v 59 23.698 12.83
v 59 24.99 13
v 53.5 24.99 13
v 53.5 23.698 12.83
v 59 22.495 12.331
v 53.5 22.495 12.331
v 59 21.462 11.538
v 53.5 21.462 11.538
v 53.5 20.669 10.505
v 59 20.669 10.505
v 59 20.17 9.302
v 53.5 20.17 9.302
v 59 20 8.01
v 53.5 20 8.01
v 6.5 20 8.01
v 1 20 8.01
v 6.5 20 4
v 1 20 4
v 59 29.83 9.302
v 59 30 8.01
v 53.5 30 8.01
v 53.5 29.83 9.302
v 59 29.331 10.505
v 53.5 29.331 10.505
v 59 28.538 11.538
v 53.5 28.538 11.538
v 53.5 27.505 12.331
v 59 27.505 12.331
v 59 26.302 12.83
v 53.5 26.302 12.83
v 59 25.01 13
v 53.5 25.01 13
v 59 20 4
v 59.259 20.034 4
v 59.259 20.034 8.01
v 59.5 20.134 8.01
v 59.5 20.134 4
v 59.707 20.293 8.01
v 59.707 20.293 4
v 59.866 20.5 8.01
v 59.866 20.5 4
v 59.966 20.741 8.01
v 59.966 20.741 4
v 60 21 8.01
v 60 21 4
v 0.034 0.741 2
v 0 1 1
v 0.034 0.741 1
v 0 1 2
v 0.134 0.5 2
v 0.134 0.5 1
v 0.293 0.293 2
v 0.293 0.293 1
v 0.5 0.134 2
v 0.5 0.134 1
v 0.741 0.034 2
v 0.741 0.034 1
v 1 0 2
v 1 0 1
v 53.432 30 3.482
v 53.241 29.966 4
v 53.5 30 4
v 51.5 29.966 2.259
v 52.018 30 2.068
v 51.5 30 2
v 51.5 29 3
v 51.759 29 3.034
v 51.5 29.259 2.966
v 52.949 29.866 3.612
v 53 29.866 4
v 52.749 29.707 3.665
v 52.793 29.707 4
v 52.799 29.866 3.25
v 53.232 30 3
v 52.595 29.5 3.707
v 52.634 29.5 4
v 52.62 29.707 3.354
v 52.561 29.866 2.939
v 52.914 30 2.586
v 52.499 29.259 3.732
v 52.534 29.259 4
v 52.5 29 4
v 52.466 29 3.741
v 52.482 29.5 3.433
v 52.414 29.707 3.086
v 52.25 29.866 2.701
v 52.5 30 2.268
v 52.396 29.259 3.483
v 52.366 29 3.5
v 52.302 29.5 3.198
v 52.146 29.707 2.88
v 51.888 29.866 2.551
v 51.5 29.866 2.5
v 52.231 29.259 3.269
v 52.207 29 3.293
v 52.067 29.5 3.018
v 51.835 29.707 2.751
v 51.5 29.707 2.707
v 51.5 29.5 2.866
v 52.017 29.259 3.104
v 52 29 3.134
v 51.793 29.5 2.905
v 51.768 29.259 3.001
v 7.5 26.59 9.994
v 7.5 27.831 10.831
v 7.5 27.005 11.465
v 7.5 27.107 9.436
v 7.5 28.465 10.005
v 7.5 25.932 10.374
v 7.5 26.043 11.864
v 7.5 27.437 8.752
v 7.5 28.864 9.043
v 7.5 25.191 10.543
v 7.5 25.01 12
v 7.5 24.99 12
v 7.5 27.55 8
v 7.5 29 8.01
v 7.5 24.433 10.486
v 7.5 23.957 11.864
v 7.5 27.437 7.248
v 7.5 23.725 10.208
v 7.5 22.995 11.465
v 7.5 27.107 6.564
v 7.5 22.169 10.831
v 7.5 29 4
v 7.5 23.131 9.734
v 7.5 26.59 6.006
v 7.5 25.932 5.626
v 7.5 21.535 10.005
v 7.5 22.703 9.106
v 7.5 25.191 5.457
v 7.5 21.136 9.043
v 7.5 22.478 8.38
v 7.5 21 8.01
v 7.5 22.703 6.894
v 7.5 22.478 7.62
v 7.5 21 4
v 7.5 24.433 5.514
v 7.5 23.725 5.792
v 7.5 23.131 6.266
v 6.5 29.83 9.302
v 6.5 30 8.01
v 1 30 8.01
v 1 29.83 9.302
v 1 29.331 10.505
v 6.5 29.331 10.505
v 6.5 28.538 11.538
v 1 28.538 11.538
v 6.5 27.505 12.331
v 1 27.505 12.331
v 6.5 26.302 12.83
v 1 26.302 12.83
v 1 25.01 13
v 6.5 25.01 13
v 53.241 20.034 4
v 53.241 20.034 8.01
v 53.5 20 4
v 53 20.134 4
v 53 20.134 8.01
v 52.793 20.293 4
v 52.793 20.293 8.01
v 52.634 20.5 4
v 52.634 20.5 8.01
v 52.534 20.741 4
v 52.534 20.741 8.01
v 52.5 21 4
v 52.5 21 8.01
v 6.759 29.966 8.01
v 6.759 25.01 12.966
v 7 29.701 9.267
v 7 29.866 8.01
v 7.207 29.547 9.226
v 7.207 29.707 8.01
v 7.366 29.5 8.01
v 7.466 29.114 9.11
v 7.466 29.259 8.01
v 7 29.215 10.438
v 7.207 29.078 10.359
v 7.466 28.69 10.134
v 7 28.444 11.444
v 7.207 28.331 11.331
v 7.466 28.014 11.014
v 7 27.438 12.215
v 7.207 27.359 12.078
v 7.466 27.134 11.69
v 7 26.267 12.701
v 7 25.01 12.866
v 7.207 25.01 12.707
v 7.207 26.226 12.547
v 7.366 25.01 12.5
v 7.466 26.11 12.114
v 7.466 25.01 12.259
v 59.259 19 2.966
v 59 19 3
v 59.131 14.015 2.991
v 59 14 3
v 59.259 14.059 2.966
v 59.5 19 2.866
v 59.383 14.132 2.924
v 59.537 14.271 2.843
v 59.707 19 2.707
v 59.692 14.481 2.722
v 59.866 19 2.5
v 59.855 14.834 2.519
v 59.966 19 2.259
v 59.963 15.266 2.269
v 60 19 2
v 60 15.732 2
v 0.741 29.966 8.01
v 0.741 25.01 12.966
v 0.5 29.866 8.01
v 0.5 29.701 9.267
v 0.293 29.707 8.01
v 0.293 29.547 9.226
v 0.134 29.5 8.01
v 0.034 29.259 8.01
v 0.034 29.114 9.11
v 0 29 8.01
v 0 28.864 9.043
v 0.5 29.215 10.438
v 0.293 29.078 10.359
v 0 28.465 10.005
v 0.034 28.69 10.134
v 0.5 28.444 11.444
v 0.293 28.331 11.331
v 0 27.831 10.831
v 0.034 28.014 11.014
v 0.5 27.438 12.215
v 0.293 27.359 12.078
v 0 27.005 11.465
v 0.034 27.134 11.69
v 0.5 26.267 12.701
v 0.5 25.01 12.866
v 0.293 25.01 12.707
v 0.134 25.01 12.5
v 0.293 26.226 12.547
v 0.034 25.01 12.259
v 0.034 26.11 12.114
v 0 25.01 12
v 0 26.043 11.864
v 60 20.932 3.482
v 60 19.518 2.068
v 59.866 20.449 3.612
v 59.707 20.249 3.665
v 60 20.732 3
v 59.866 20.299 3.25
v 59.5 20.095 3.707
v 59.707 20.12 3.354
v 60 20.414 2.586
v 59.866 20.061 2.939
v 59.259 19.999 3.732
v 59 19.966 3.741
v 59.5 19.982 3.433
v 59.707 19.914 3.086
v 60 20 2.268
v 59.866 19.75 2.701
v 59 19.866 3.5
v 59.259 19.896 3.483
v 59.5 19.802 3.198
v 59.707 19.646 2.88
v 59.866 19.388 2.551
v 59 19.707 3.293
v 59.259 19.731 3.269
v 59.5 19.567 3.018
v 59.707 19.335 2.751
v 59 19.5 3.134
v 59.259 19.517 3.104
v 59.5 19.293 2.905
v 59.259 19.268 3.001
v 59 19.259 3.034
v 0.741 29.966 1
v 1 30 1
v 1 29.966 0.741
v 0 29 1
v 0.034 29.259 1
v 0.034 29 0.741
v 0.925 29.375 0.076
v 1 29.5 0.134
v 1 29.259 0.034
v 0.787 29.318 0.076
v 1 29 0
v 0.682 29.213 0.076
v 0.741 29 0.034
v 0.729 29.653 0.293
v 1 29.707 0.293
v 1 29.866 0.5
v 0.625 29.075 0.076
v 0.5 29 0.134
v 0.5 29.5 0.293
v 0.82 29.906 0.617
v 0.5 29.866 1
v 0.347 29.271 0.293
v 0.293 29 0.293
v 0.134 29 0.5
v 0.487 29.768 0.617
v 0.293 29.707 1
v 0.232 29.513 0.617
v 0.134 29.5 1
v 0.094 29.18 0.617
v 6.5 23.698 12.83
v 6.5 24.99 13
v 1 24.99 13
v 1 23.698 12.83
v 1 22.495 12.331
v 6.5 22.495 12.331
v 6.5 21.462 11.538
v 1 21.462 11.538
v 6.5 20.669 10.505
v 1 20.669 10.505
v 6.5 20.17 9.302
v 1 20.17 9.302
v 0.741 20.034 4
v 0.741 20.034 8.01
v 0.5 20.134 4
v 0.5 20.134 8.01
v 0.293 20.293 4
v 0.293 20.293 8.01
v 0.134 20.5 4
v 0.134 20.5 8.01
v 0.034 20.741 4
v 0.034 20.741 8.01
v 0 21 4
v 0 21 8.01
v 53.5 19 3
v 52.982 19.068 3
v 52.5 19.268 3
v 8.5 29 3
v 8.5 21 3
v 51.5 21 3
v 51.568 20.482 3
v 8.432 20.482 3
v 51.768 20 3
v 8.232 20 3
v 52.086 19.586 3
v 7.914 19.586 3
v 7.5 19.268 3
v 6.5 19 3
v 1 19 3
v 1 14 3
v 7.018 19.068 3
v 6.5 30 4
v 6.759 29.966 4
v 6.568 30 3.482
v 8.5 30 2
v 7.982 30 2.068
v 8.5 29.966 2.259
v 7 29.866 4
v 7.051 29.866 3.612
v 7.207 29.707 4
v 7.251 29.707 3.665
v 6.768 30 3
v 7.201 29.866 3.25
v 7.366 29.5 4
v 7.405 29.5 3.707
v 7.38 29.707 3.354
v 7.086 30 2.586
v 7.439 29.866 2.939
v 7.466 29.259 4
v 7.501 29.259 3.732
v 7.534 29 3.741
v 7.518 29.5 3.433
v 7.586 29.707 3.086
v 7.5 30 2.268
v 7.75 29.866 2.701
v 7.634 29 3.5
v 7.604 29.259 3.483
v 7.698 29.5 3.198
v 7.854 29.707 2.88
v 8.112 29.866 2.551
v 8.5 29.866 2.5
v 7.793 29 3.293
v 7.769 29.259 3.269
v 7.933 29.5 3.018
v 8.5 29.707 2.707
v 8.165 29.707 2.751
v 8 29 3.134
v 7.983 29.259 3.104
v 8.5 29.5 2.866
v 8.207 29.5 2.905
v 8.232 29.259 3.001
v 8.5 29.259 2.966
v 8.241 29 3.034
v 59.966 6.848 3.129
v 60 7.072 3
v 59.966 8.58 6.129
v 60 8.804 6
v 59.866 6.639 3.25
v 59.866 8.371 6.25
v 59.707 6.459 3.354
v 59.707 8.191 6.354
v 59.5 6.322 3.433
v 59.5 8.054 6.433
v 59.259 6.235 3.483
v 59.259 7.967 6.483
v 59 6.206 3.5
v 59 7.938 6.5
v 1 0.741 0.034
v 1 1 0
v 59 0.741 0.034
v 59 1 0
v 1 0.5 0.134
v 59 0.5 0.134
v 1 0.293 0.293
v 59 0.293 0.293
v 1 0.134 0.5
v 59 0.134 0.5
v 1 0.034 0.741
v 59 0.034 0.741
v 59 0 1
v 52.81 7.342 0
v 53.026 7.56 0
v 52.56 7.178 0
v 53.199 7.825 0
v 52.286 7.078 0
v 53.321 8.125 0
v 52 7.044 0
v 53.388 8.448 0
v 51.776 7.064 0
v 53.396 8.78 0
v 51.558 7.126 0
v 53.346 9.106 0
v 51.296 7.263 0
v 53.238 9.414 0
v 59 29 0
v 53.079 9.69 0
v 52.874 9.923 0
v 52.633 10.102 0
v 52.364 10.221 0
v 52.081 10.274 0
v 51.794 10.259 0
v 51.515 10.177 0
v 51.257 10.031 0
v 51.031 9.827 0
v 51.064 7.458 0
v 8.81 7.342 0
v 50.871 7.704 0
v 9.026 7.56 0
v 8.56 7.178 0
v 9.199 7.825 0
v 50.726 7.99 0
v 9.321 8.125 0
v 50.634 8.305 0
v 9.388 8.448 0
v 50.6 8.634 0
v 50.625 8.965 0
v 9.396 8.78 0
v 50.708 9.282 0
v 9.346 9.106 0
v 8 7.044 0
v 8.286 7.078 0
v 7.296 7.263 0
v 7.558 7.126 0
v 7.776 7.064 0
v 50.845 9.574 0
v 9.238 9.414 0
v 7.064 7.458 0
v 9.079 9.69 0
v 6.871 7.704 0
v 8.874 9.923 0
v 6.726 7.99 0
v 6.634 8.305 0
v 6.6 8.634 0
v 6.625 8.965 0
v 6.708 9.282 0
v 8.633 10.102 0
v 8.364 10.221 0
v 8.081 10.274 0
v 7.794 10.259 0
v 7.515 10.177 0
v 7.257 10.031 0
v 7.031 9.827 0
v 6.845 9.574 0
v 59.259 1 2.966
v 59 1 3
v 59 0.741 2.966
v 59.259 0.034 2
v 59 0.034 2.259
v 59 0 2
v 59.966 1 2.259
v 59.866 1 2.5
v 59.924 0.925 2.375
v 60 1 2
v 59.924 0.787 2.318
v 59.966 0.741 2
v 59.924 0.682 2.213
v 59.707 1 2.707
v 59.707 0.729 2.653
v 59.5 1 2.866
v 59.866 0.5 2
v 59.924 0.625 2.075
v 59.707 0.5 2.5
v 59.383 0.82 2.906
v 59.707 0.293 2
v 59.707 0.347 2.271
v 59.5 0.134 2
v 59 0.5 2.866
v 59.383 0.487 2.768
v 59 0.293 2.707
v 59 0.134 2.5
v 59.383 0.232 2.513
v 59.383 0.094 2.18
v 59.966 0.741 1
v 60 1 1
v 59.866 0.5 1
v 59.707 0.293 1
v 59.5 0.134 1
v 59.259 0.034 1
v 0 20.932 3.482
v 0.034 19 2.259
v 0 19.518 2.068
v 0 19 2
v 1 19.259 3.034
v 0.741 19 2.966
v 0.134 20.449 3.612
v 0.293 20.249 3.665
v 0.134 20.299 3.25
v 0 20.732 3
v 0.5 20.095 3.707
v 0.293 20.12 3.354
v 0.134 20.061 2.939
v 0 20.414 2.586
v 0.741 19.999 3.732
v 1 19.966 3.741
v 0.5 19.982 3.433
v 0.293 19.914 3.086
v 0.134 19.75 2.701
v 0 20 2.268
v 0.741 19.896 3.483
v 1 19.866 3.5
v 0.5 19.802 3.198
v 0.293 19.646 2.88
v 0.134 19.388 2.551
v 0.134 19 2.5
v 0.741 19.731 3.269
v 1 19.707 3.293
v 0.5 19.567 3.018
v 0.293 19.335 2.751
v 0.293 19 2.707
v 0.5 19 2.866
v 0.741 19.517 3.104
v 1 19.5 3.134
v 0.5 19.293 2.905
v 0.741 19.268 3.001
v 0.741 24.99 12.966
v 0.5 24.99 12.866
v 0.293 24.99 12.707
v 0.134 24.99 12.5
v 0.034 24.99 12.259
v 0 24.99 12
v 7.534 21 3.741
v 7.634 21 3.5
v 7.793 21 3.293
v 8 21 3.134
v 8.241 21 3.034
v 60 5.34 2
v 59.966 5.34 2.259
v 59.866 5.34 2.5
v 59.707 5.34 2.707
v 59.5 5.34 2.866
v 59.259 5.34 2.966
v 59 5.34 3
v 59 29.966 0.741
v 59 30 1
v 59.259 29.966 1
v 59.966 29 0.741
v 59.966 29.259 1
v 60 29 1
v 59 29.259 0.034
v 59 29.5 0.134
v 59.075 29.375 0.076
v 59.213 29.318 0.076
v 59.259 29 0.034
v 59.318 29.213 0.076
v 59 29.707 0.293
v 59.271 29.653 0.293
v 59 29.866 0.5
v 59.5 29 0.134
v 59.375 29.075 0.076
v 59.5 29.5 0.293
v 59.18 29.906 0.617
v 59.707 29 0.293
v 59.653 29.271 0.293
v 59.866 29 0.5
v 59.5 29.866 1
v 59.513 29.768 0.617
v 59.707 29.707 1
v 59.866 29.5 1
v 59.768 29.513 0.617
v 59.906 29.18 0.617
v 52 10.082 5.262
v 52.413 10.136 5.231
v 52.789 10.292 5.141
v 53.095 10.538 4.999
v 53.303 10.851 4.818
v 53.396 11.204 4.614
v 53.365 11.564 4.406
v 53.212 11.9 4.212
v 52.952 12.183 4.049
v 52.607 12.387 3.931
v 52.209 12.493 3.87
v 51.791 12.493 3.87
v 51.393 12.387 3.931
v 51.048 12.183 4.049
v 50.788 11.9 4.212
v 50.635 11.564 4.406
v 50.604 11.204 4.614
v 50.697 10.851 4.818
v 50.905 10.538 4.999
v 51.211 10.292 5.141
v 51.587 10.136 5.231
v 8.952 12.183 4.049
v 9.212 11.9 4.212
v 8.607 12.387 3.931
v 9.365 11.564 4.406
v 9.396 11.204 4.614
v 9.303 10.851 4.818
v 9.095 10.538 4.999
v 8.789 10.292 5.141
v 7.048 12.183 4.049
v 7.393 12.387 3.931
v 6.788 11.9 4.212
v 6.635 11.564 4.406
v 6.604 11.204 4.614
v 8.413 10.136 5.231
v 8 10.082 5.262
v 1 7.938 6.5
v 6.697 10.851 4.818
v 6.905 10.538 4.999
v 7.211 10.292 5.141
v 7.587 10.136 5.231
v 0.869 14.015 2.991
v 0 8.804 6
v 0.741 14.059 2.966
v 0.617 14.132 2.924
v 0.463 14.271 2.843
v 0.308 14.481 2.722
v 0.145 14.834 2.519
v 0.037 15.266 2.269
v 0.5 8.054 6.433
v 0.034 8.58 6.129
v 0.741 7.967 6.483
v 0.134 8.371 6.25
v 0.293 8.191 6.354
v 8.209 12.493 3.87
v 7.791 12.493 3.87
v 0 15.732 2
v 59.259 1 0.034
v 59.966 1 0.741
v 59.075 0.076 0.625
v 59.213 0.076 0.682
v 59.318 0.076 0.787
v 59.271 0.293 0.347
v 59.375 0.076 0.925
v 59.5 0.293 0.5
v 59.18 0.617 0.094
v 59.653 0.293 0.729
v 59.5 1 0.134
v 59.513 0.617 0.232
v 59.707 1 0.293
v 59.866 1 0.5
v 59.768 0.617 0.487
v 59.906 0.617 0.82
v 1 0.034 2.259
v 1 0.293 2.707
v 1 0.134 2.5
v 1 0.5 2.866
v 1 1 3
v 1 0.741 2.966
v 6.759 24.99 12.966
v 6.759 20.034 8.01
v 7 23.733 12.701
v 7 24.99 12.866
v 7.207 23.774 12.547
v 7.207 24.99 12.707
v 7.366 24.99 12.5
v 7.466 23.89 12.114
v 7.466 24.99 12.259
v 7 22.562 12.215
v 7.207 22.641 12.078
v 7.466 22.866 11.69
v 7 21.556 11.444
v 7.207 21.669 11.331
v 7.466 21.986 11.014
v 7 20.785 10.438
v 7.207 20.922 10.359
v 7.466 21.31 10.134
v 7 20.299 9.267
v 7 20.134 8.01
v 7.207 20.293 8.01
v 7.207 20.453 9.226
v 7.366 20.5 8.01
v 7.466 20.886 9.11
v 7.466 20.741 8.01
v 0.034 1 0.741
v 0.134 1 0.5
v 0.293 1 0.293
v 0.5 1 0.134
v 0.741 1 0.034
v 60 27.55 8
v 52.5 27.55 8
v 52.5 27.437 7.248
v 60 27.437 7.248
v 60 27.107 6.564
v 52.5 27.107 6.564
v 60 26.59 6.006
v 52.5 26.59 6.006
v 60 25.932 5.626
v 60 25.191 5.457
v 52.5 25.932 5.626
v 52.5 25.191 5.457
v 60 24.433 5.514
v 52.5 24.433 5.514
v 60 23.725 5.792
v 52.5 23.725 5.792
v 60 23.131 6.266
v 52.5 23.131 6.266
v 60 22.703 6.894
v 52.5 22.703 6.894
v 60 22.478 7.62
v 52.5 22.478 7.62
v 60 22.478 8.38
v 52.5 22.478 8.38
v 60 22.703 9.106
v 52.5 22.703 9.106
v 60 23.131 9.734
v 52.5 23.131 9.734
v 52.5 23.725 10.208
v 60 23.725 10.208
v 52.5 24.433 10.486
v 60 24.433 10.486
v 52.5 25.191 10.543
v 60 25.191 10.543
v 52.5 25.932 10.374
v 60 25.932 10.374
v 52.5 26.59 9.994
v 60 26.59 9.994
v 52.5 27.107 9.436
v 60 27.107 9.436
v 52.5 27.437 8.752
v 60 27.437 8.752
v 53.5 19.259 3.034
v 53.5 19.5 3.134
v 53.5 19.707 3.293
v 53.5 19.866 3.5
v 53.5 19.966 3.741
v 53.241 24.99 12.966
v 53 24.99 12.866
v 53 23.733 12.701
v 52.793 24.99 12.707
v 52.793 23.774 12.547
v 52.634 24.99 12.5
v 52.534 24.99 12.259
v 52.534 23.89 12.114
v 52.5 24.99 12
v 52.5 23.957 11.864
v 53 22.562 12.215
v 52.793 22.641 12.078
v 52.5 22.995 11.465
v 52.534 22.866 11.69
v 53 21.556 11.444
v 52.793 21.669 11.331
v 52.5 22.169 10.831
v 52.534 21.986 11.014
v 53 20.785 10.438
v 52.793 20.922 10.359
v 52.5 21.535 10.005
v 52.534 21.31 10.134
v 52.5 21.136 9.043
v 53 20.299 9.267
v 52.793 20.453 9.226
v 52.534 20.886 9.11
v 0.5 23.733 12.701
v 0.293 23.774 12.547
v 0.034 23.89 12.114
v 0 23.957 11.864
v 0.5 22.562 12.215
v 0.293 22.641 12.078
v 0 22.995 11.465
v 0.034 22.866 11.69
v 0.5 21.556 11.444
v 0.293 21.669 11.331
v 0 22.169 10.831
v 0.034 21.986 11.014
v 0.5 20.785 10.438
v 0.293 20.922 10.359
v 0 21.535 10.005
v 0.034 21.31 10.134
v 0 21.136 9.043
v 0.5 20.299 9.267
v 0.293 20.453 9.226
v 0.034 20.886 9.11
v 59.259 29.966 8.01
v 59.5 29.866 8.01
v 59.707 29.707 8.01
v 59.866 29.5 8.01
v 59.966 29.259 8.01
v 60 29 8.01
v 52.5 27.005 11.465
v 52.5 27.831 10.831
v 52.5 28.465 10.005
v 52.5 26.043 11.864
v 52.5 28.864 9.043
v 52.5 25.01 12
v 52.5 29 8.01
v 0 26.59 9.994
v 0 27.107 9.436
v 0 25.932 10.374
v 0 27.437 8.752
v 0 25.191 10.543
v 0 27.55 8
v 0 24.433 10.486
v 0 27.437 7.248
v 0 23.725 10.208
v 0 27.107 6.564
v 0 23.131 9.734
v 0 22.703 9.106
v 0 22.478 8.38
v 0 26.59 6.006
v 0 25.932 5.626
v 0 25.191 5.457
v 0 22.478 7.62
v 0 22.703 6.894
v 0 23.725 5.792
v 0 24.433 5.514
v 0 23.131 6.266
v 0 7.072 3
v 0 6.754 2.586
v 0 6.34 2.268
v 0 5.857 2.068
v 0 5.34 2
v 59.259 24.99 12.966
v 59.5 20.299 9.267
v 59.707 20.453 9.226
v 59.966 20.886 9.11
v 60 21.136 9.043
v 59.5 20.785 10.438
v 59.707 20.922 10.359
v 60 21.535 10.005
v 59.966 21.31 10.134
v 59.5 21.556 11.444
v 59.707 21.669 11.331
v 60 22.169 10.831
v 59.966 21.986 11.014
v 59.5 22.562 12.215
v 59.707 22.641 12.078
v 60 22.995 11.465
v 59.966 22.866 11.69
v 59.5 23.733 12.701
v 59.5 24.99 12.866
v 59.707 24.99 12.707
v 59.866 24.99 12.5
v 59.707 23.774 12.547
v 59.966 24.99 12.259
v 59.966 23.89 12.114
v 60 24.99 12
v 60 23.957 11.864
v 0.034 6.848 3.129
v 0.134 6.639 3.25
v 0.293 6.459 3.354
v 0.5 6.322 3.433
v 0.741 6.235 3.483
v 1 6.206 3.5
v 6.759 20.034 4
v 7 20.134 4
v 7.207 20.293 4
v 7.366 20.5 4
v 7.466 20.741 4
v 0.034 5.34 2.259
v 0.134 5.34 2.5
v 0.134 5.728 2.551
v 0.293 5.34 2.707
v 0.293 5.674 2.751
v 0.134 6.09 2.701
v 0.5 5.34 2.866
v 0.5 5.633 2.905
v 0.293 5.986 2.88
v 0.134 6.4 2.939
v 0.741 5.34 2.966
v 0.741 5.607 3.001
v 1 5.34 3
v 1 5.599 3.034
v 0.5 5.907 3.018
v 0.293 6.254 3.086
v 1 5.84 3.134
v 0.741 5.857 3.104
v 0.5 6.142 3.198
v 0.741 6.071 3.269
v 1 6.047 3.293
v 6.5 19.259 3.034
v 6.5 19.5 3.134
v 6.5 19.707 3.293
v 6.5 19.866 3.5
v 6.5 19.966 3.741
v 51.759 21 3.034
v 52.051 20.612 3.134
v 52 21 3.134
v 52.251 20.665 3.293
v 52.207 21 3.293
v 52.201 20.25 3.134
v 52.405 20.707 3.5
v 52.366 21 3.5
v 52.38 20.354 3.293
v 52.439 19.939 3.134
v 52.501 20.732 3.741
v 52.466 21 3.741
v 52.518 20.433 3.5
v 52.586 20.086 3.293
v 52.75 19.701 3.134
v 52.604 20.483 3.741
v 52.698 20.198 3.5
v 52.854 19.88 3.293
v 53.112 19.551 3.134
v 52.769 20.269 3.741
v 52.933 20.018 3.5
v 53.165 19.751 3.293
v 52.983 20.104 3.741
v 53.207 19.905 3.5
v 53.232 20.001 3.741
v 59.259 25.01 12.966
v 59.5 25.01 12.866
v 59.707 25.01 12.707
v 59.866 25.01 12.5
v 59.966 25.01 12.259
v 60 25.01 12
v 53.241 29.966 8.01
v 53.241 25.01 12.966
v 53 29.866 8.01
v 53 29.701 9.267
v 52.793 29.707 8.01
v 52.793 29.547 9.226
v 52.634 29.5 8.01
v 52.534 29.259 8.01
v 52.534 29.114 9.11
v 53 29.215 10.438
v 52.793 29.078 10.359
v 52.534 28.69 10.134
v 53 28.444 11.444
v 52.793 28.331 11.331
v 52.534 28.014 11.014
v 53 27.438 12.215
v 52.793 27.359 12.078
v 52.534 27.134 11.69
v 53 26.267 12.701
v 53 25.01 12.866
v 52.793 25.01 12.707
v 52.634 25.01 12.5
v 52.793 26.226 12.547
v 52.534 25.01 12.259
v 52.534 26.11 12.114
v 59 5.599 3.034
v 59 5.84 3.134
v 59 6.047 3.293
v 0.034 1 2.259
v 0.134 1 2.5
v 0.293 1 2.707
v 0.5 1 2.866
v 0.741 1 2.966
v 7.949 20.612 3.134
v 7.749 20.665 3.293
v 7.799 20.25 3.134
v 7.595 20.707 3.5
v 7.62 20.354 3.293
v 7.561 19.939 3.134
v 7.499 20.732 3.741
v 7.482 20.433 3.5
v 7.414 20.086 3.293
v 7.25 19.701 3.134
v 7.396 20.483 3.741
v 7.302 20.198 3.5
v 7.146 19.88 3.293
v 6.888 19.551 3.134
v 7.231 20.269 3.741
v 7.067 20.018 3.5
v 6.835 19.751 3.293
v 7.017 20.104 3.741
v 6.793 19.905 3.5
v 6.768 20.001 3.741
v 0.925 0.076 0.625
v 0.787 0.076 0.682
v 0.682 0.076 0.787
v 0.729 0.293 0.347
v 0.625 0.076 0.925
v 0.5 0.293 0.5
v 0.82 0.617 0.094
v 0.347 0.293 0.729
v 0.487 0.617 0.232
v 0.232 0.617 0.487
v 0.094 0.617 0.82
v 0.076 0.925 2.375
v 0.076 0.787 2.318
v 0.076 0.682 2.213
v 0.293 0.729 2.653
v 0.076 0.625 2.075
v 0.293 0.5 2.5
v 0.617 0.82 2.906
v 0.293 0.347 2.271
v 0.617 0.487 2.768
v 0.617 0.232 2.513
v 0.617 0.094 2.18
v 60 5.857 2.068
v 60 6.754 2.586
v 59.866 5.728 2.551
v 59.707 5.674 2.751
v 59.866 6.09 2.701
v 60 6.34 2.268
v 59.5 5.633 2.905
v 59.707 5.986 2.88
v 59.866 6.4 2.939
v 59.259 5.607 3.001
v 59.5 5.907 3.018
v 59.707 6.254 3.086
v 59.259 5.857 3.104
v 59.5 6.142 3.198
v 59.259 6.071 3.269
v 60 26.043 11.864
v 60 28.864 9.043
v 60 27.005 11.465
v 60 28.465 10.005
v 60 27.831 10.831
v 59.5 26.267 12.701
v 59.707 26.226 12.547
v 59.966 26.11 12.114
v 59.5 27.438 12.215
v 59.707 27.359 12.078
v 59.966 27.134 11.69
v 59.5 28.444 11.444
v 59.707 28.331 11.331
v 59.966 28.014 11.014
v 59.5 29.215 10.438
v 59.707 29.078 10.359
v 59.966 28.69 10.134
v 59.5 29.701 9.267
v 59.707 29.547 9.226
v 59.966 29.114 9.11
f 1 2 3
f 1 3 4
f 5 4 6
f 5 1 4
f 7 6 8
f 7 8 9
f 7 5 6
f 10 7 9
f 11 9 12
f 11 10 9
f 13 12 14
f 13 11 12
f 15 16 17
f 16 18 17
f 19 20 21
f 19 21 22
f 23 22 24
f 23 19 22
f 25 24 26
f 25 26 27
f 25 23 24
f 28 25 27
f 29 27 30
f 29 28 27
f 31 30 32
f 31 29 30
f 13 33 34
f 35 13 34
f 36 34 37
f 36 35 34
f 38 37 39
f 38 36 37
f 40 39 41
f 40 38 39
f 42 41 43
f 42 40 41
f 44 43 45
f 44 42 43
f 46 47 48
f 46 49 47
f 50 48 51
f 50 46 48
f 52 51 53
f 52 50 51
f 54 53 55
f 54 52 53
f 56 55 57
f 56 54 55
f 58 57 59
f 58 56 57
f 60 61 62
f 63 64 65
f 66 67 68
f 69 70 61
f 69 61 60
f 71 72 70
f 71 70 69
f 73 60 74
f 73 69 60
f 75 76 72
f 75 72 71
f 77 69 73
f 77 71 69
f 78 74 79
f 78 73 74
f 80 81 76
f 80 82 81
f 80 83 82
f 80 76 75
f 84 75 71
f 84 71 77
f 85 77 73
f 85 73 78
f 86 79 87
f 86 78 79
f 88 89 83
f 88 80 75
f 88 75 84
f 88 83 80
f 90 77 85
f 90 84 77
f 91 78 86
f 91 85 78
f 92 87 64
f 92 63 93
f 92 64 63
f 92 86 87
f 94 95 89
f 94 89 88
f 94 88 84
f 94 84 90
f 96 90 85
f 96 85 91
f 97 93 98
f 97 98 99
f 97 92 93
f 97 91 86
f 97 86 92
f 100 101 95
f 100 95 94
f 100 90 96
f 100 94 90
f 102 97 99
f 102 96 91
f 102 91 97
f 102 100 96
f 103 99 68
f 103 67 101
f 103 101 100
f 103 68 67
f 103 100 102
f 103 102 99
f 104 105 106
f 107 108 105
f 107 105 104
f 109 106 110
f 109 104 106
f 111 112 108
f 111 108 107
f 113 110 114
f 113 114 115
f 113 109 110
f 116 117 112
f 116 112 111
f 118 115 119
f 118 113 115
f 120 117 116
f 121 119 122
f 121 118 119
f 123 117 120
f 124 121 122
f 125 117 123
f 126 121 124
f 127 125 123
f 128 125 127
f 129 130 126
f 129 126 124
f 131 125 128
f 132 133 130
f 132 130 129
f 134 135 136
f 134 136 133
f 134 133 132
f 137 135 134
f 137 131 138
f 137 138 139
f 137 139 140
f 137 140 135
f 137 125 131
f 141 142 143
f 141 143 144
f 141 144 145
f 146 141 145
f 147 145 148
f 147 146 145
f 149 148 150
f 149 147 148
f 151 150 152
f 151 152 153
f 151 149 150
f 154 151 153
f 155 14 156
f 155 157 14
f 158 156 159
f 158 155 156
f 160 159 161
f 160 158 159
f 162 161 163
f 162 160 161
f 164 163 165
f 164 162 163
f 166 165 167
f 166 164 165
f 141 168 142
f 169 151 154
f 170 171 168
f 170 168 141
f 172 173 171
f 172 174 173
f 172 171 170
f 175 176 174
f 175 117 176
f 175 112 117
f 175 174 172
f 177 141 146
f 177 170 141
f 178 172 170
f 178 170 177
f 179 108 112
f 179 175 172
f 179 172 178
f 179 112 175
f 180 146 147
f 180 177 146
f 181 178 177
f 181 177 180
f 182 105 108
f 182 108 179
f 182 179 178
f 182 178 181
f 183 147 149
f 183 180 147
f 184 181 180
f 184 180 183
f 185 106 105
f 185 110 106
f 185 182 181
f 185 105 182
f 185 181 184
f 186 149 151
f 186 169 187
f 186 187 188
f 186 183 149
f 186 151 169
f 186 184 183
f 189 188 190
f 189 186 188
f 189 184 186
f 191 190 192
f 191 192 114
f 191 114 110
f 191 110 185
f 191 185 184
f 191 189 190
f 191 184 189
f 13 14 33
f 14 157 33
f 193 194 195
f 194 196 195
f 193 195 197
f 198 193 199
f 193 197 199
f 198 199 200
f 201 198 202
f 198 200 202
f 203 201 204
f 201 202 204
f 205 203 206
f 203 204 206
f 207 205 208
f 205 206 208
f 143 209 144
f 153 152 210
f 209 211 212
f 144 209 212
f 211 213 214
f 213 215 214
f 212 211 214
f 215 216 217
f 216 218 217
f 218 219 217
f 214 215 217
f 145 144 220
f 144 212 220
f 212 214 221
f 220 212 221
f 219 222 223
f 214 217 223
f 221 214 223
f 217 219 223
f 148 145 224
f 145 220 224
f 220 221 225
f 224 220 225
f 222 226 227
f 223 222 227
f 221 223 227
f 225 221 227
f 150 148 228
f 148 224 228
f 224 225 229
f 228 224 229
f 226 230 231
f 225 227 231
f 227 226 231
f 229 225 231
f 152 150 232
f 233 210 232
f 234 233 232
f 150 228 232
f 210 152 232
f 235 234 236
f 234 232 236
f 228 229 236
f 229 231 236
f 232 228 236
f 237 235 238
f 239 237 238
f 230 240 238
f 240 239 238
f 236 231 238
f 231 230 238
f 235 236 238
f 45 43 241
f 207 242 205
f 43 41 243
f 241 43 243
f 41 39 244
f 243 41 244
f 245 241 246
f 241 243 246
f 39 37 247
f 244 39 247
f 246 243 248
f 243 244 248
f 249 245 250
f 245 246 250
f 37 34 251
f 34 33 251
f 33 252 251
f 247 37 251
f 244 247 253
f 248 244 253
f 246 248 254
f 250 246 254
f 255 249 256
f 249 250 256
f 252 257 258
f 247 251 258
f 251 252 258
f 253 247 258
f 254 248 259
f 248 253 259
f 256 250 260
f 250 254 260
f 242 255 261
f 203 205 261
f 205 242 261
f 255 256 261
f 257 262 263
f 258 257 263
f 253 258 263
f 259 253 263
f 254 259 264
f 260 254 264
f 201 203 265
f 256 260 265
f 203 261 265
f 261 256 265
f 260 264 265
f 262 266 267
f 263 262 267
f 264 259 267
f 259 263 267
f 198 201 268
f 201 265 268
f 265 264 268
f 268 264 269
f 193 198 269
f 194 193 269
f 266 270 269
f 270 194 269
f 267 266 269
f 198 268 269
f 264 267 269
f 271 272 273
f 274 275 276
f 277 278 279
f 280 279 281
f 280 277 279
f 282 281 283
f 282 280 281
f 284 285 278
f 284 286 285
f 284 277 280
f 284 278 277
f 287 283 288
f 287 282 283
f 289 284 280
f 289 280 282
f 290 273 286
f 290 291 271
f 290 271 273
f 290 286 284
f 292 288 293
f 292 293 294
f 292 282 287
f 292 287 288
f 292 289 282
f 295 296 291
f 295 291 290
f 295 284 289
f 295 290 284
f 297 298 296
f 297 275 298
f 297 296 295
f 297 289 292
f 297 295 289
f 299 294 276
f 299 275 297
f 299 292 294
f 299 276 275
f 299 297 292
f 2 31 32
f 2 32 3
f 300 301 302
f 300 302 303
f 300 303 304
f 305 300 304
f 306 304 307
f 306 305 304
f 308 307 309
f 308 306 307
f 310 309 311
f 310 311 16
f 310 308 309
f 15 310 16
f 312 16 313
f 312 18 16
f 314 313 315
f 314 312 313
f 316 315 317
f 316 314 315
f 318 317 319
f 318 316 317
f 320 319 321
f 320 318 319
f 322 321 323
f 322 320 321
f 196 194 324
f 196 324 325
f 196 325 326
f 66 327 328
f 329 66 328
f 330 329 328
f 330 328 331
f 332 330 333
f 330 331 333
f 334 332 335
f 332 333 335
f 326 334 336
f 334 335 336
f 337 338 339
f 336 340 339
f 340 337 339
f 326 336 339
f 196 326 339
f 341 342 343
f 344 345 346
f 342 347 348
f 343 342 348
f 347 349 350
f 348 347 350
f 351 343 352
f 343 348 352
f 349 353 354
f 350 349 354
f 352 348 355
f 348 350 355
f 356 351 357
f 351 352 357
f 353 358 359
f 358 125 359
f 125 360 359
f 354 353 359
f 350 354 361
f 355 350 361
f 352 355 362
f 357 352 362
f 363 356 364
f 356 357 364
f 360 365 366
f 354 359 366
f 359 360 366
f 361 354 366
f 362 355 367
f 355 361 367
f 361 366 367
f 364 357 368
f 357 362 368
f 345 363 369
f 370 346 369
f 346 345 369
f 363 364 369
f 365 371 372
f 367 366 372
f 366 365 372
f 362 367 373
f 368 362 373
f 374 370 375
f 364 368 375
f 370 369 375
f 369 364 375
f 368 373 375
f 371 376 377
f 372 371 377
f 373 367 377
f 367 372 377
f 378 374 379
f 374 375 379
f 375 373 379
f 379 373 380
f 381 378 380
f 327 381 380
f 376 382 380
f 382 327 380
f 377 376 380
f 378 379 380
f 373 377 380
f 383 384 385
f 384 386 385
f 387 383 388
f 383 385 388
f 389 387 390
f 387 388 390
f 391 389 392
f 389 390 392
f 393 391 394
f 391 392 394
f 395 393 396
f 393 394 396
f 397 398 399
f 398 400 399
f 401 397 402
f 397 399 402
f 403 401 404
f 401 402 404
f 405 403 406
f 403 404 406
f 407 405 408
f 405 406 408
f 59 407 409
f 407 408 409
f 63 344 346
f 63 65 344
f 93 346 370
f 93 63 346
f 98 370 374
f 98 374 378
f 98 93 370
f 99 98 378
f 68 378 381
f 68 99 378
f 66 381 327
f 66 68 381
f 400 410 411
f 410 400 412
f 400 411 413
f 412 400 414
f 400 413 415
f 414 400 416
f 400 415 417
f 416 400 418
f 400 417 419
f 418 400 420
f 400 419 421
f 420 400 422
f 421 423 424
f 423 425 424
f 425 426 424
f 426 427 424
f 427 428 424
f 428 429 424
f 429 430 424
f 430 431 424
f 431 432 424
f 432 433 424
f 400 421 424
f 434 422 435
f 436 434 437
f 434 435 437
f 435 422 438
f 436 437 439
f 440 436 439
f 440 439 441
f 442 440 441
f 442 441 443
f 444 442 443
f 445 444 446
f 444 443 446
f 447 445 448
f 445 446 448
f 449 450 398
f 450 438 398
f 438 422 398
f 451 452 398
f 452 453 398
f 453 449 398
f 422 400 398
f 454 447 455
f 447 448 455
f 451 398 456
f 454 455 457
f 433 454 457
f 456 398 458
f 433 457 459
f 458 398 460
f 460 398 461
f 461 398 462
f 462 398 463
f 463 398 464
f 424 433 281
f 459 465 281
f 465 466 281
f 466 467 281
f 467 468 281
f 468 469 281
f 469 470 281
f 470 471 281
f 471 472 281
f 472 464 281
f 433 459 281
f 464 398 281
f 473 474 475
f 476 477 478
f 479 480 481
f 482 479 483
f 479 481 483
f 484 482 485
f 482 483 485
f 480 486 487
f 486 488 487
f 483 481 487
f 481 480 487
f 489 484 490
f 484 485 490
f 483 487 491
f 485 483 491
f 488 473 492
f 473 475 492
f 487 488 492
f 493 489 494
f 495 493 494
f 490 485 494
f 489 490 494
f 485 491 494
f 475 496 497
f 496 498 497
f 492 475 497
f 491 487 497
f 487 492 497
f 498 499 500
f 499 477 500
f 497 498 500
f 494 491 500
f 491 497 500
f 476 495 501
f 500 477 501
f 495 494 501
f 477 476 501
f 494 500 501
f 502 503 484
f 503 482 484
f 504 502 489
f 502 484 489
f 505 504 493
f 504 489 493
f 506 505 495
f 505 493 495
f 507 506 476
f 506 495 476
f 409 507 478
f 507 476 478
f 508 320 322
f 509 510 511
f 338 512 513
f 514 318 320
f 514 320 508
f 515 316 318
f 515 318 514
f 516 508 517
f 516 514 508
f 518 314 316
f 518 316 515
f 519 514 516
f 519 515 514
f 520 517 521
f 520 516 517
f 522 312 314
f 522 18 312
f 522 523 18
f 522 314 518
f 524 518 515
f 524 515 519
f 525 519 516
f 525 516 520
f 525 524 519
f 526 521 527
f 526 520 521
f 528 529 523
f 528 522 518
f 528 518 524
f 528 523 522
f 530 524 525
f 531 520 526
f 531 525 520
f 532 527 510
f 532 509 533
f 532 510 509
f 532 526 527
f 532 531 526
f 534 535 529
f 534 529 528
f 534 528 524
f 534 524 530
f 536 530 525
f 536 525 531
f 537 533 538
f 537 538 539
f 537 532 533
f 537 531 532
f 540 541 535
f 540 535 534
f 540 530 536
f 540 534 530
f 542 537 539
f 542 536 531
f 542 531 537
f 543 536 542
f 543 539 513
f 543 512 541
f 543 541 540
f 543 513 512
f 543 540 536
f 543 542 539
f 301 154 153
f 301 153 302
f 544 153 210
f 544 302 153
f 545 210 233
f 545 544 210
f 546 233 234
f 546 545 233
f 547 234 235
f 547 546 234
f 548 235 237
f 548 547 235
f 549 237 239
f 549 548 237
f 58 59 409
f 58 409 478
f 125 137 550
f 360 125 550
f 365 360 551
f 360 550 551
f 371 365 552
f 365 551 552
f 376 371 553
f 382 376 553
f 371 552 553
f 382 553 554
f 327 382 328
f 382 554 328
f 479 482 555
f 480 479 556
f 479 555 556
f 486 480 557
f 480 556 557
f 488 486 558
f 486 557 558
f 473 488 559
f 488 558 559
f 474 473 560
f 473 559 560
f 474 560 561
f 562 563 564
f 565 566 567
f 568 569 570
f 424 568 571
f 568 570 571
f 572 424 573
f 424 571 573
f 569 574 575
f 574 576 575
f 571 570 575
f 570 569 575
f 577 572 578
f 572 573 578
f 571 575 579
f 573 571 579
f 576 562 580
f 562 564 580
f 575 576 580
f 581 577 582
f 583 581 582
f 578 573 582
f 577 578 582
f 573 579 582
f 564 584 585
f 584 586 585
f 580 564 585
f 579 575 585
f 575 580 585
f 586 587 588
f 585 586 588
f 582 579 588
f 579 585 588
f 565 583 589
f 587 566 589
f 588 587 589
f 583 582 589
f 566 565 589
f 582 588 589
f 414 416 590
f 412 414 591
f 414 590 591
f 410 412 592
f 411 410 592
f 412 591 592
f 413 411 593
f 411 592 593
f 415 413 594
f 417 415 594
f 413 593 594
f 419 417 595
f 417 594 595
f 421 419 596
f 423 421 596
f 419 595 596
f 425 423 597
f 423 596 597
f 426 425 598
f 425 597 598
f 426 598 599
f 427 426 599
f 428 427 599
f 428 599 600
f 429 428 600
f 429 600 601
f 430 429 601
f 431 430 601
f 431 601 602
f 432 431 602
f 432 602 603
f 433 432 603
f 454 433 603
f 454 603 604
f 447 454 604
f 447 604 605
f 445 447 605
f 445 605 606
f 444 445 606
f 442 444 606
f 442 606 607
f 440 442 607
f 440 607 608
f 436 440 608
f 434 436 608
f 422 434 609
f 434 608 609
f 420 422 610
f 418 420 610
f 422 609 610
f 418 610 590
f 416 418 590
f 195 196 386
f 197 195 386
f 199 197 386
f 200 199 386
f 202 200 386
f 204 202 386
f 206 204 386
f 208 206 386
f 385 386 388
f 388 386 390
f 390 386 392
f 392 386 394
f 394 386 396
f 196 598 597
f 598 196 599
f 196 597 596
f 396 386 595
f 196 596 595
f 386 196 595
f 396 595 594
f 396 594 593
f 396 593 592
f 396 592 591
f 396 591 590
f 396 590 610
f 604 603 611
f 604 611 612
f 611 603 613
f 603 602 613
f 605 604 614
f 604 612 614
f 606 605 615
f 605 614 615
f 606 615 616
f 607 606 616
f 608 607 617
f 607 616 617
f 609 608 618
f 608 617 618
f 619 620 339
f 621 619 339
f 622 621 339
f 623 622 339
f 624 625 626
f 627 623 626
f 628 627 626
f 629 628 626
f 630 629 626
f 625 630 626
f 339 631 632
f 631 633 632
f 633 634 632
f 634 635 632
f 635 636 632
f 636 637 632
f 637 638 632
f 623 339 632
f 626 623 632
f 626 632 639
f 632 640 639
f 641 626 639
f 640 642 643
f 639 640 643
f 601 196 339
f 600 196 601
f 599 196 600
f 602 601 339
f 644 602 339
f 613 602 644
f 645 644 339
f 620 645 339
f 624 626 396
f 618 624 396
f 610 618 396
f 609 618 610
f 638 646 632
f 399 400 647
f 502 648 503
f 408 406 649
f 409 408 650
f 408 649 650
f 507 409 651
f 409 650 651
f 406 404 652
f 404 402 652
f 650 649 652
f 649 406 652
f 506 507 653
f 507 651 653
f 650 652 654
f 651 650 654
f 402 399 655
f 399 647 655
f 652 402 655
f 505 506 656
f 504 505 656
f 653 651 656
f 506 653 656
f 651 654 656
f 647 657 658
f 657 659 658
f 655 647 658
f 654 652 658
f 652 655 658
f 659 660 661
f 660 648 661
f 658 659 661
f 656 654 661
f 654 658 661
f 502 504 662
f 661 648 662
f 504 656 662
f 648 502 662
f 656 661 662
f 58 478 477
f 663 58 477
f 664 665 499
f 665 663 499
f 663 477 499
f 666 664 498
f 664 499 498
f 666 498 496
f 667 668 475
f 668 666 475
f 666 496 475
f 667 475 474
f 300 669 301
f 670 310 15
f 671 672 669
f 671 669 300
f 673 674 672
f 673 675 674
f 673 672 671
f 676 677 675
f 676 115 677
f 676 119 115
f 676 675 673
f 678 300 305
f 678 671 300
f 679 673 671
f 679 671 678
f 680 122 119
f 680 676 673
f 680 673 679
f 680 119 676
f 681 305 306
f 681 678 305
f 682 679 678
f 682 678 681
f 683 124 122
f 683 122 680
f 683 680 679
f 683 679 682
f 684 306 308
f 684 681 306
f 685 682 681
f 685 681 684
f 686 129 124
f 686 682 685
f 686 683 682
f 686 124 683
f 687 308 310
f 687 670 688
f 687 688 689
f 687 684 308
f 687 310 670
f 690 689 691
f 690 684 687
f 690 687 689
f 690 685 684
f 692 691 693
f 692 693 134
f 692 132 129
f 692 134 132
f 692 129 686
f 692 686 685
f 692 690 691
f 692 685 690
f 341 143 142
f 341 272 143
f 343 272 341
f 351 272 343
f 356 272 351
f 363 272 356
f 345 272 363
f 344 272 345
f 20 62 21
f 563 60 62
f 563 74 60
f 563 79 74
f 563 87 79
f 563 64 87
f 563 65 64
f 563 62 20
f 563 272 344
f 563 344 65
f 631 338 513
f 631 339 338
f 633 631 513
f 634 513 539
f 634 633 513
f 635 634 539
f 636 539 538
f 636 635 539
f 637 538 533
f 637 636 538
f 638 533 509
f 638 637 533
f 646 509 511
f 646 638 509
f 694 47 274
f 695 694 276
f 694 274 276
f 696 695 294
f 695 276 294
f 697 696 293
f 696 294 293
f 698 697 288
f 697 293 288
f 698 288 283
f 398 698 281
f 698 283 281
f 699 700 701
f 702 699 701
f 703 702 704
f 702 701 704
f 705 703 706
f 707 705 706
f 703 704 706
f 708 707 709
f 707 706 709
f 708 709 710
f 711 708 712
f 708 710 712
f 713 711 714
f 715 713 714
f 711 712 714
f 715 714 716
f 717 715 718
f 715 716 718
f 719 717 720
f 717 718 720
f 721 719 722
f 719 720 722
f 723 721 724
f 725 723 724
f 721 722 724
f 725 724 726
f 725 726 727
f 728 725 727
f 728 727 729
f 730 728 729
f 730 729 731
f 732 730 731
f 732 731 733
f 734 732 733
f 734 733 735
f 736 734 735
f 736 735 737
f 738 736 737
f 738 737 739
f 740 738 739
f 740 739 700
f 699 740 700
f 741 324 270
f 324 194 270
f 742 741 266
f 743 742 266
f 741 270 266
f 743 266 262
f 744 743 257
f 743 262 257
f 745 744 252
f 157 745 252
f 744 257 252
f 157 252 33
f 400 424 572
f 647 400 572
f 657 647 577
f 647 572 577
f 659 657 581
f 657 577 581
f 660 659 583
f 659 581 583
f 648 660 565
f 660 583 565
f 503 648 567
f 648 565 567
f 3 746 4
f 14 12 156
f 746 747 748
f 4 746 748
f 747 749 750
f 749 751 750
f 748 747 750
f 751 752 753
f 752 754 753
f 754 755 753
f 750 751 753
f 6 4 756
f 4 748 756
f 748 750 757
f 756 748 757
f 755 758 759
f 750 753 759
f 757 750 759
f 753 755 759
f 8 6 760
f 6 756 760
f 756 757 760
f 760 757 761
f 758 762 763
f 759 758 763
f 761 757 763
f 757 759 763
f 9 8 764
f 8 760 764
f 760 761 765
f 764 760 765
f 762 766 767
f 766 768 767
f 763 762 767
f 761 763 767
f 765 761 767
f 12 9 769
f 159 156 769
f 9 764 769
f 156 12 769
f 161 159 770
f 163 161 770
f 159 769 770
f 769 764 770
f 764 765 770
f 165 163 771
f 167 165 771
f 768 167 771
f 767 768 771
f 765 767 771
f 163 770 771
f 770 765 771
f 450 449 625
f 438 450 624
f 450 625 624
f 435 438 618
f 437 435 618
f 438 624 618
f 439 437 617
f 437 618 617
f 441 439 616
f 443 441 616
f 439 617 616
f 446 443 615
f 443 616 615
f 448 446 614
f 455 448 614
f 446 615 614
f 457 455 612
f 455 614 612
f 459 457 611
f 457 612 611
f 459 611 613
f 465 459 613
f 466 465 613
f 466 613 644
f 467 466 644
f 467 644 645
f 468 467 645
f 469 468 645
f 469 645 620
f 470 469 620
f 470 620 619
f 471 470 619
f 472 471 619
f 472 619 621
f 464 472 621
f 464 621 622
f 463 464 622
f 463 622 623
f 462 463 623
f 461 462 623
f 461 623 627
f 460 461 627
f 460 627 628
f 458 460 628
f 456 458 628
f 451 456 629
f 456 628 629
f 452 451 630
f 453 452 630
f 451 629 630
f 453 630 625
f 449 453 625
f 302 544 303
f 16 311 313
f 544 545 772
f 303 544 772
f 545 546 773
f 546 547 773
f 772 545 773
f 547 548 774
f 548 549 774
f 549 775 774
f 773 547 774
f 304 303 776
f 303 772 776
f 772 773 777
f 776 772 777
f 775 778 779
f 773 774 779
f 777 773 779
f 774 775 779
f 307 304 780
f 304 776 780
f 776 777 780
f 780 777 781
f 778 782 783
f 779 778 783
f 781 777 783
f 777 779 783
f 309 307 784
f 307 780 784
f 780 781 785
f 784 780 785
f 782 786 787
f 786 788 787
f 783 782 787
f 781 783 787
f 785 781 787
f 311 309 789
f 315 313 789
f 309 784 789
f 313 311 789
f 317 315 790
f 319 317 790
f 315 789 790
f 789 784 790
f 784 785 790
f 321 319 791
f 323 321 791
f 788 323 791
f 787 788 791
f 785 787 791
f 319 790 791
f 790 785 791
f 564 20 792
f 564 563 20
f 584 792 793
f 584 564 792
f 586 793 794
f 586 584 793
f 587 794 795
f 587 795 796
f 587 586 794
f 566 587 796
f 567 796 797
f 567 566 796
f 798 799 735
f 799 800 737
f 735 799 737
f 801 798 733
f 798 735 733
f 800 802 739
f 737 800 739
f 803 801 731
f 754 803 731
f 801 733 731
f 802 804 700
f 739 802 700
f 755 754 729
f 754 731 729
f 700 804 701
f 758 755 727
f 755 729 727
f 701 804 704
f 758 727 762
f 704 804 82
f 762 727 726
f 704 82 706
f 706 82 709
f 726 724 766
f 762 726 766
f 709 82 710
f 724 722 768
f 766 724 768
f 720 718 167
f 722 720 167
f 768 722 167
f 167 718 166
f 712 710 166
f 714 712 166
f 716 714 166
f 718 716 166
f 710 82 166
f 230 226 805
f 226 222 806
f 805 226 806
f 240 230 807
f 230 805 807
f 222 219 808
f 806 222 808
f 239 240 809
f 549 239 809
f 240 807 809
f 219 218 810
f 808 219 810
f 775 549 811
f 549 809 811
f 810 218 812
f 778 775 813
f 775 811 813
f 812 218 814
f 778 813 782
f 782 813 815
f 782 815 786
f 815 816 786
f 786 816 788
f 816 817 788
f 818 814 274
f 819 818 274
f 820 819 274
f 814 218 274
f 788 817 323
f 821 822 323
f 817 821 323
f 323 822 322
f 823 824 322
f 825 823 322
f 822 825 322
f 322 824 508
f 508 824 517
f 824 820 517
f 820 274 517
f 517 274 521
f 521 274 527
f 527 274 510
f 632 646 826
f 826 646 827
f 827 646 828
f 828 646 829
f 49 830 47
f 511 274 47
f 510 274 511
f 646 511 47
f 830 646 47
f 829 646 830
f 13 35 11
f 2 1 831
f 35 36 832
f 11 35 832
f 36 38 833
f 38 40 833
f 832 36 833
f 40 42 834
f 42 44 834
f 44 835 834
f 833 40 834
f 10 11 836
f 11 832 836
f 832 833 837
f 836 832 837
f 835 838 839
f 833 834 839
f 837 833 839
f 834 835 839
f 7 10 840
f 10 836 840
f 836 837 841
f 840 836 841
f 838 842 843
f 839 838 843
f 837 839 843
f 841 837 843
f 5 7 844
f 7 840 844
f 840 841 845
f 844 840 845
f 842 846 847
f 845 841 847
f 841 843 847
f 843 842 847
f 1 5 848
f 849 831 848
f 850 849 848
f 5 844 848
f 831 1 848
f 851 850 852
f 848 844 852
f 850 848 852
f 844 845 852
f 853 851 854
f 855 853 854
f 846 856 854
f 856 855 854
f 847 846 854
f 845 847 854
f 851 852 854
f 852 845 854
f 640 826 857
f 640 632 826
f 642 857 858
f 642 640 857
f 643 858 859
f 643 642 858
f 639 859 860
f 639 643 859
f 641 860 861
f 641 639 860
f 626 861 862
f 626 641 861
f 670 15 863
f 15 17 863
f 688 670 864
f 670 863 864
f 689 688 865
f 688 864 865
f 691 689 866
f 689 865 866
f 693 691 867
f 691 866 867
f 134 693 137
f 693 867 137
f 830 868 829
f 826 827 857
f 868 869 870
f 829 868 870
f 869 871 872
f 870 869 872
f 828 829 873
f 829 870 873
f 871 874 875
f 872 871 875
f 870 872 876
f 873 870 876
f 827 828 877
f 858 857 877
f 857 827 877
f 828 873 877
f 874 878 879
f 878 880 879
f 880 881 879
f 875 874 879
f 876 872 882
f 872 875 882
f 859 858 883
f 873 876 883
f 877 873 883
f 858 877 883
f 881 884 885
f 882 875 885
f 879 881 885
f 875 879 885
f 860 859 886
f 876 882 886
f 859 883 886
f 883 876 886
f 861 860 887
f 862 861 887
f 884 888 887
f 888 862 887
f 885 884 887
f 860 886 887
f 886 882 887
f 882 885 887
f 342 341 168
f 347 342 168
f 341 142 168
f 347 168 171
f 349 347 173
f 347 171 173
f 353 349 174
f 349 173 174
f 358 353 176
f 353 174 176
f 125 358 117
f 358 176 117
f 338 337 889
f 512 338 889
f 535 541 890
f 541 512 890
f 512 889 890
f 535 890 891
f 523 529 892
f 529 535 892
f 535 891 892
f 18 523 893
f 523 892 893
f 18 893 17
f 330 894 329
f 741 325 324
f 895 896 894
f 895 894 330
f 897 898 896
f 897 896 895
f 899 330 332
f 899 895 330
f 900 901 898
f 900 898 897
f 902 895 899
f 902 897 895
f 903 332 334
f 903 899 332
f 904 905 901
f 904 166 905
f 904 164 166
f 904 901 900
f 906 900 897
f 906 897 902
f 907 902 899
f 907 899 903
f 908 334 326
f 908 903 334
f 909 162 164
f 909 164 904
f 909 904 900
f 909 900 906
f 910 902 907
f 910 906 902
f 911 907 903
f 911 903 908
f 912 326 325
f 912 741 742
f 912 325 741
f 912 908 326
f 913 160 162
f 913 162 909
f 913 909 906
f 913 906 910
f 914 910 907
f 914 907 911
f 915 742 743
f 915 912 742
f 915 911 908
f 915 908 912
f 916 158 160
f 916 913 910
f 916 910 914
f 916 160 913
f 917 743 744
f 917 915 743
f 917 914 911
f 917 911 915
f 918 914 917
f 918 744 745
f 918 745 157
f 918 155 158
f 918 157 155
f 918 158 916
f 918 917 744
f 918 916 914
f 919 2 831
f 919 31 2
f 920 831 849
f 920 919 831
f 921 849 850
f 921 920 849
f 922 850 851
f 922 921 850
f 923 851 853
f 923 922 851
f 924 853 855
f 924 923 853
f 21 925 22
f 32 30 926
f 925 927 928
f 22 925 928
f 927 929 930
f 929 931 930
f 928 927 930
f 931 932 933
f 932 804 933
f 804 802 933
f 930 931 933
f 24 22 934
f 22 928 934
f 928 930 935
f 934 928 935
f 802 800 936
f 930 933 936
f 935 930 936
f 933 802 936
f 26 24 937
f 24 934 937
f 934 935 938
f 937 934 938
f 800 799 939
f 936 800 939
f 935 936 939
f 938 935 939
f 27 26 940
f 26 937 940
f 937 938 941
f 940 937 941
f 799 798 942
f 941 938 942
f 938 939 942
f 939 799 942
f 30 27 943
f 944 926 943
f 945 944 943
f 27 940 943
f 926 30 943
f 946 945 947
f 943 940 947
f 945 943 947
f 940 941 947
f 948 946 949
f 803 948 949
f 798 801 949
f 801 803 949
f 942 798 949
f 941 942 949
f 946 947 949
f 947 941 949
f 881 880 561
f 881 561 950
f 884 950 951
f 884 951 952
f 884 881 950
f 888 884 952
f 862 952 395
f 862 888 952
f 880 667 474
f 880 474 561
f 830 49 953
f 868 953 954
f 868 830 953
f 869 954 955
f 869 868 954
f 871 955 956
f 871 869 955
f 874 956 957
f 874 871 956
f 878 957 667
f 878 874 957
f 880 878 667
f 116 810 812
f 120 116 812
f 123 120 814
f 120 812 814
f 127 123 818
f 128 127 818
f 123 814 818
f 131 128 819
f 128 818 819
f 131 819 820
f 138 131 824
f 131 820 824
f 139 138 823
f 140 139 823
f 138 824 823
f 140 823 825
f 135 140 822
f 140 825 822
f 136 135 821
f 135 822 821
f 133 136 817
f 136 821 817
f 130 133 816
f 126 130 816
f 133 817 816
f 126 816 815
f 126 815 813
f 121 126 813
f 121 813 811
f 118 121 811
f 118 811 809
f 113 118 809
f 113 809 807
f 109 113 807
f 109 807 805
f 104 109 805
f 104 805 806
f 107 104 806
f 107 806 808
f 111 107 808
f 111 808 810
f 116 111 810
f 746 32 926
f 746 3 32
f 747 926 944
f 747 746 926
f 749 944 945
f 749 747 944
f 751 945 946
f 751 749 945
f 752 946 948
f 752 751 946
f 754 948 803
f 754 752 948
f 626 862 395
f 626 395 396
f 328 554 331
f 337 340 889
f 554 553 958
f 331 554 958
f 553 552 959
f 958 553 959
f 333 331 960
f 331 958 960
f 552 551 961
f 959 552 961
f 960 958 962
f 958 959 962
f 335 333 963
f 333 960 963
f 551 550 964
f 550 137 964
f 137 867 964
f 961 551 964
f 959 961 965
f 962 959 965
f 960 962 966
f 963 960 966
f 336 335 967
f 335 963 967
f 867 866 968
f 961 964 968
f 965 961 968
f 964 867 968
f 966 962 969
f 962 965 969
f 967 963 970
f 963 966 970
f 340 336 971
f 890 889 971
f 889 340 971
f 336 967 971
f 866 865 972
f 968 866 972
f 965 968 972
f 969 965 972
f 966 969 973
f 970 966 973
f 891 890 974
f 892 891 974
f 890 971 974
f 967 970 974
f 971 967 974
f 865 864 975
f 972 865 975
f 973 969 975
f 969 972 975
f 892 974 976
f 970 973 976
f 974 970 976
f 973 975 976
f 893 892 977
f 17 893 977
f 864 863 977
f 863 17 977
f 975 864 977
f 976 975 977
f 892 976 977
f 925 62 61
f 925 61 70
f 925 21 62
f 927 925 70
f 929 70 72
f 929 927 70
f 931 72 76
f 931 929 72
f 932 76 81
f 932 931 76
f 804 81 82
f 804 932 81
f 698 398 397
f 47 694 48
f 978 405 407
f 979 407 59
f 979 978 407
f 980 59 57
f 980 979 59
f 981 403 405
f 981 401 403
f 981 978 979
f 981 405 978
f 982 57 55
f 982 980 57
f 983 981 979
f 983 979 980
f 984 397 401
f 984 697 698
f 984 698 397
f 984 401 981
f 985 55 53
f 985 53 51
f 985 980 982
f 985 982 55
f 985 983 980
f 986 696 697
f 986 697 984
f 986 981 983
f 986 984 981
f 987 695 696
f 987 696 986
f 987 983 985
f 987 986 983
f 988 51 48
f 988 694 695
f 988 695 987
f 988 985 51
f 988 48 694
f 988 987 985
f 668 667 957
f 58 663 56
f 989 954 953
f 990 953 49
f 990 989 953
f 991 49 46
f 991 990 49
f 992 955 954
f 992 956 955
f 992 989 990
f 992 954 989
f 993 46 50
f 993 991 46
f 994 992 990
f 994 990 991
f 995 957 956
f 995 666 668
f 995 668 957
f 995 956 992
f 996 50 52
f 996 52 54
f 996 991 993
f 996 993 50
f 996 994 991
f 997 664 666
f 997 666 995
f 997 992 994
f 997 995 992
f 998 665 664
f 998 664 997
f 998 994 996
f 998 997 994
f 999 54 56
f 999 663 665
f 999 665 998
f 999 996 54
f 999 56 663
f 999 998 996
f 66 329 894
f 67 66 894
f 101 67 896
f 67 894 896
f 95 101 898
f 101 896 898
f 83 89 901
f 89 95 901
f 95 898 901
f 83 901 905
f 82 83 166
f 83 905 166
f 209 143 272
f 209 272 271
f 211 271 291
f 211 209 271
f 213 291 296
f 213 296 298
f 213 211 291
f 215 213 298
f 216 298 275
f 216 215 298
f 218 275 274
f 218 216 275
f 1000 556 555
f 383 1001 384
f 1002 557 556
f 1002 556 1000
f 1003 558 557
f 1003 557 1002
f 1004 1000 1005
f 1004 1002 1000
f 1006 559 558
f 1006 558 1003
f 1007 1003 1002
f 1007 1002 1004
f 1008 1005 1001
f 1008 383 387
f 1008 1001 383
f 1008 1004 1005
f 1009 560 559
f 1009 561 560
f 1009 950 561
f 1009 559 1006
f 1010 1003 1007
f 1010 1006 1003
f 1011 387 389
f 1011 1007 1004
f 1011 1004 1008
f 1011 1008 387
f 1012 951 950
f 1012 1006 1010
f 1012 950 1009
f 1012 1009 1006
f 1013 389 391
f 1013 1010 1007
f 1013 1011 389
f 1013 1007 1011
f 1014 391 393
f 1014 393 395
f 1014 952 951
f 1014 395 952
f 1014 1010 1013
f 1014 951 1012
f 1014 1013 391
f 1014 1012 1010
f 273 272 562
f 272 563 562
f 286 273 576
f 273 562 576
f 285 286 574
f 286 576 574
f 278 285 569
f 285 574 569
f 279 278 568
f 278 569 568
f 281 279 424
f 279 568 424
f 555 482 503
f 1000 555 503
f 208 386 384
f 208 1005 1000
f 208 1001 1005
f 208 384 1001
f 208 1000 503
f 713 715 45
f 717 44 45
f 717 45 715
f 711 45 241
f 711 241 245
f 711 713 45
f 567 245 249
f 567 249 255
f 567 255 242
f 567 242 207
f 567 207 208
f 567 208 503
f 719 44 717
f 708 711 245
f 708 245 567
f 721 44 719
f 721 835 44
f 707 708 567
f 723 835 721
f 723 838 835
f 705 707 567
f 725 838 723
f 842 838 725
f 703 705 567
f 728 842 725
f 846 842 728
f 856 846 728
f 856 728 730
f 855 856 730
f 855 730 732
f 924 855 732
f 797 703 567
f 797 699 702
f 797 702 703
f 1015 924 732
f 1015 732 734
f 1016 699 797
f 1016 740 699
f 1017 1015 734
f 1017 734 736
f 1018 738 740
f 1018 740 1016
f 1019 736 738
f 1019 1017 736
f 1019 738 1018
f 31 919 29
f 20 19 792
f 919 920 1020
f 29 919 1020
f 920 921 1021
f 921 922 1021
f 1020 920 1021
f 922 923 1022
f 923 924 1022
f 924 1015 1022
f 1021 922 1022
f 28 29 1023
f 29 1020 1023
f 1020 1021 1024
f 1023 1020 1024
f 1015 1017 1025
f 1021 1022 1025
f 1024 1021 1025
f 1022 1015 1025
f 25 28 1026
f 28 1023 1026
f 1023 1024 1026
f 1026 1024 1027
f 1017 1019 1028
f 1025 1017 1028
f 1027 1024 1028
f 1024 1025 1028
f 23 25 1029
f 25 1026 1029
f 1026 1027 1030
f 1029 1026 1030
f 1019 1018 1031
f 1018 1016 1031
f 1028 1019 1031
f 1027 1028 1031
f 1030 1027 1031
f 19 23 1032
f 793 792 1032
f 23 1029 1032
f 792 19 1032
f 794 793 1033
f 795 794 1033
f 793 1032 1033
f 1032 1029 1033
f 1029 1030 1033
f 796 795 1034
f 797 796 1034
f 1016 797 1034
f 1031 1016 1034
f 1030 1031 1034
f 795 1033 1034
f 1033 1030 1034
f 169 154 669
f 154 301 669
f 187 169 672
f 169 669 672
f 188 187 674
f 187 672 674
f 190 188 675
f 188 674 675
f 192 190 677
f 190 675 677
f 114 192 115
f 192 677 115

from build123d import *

# Parameters (mm, degrees)
PAD_DEPTH       = 60
SKETCH001_W     = 10
SKETCH001_H     = 7.5
PAD001_DEPTH    = 10
SKETCH002_R     = 2.55
POCKET_DEPTH    = 60
FILLET_R        = 4.99
FILLET001_R     = 1
SKETCH003_R     = 1.4
POCKET001_DEPTH = 7


with BuildPart() as part:
    # Sketch → Pad (new body)
    with BuildSketch(Plane.YZ):
        with BuildLine():
            Line((0, 0), (30, 0))
            Line((30, 0), (30, 3))
            Line((30, 3), (14, 3))
            Line((14, 3), (7.9378221735, 6.5))
            Line((6.205771366, 3.5), (7.9378221735, 6.5))
            ThreePointArc((5.3397459622, 3), (5.8397459622, 3.1339745962), (6.205771366, 3.5))
            Line((0, 3), (5.3397459622, 3))
            Line((0, 0), (0, 3))
        make_face()
    extrude(amount=PAD_DEPTH)

    # Sketch001 (on Face3 of Pad) → Pad001 (join)
    with BuildSketch(Plane(origin=(0, 0, 3), x_dir=(0, -1, 0), z_dir=(0, 0, 1))):
        with Locations((-25, 3.75)):
            Rectangle(SKETCH001_W, SKETCH001_H)
        with Locations((-25, 56.25)):
            Rectangle(SKETCH001_W, SKETCH001_H)
    extrude(amount=PAD001_DEPTH)

    # Sketch002 (on Face15 of Pad001) → Pocket (cut)
    with BuildSketch(Plane(origin=(0, 0, 0), x_dir=(0, 1, 0), z_dir=(-1, 0, 0))):
        with Locations((25, -8)):
            Circle(SKETCH002_R)
    extrude(amount=-POCKET_DEPTH, mode=Mode.SUBTRACT)

    # Fillet
    fillet_edges = [part.edges().sort_by_distance(p)[0] for p in [
        (56.25, 30, 13),
        (56.25, 20, 13),
        (3.75, 30, 13),
        (3.75, 20, 13),
    ]]
    fillet(fillet_edges, radius=FILLET_R)

    # Fillet001
    fillet001_edges = [part.edges().sort_by_distance(p)[0] for p in [
        (7.5, 30, 5.505),
        (0, 30, 4.005),
        (52.5, 30, 5.505),
        (60, 30, 4.005),
        (30, 30, 3),
        (30, 30, 0),
        (60, 15, 0),
        (60, 17, 3),
        (0, 17, 3),
        (0, 15, 0),
        (30, 0, 3),
        (60, 2.669873, 3),
        (0, 2.669873, 3),
        (30, 0, 0),
        (0, 0, 1.5),
        (60, 0, 1.5),
        (52.5, 25, 3),
        (7.5, 25, 3),
        (3.75, 20, 3),
        (56.25, 20, 3),
    ]]
    fillet(fillet001_edges, radius=FILLET001_R)

    # Sketch003 (on Face17 of Fillet) → Pocket001 (cut)
    with BuildSketch(Plane(origin=(0, 4.7990381057, 8.3121778265), x_dir=(0, -0.8660254038, 0.5), z_dir=(0, 0.5, 0.8660254038))):
        with Locations((-7.5, 52)):
            Circle(SKETCH003_R)
        with Locations((-7.5, 8)):
            Circle(SKETCH003_R)
    extrude(amount=-POCKET001_DEPTH, mode=Mode.SUBTRACT)


solid = part.part
